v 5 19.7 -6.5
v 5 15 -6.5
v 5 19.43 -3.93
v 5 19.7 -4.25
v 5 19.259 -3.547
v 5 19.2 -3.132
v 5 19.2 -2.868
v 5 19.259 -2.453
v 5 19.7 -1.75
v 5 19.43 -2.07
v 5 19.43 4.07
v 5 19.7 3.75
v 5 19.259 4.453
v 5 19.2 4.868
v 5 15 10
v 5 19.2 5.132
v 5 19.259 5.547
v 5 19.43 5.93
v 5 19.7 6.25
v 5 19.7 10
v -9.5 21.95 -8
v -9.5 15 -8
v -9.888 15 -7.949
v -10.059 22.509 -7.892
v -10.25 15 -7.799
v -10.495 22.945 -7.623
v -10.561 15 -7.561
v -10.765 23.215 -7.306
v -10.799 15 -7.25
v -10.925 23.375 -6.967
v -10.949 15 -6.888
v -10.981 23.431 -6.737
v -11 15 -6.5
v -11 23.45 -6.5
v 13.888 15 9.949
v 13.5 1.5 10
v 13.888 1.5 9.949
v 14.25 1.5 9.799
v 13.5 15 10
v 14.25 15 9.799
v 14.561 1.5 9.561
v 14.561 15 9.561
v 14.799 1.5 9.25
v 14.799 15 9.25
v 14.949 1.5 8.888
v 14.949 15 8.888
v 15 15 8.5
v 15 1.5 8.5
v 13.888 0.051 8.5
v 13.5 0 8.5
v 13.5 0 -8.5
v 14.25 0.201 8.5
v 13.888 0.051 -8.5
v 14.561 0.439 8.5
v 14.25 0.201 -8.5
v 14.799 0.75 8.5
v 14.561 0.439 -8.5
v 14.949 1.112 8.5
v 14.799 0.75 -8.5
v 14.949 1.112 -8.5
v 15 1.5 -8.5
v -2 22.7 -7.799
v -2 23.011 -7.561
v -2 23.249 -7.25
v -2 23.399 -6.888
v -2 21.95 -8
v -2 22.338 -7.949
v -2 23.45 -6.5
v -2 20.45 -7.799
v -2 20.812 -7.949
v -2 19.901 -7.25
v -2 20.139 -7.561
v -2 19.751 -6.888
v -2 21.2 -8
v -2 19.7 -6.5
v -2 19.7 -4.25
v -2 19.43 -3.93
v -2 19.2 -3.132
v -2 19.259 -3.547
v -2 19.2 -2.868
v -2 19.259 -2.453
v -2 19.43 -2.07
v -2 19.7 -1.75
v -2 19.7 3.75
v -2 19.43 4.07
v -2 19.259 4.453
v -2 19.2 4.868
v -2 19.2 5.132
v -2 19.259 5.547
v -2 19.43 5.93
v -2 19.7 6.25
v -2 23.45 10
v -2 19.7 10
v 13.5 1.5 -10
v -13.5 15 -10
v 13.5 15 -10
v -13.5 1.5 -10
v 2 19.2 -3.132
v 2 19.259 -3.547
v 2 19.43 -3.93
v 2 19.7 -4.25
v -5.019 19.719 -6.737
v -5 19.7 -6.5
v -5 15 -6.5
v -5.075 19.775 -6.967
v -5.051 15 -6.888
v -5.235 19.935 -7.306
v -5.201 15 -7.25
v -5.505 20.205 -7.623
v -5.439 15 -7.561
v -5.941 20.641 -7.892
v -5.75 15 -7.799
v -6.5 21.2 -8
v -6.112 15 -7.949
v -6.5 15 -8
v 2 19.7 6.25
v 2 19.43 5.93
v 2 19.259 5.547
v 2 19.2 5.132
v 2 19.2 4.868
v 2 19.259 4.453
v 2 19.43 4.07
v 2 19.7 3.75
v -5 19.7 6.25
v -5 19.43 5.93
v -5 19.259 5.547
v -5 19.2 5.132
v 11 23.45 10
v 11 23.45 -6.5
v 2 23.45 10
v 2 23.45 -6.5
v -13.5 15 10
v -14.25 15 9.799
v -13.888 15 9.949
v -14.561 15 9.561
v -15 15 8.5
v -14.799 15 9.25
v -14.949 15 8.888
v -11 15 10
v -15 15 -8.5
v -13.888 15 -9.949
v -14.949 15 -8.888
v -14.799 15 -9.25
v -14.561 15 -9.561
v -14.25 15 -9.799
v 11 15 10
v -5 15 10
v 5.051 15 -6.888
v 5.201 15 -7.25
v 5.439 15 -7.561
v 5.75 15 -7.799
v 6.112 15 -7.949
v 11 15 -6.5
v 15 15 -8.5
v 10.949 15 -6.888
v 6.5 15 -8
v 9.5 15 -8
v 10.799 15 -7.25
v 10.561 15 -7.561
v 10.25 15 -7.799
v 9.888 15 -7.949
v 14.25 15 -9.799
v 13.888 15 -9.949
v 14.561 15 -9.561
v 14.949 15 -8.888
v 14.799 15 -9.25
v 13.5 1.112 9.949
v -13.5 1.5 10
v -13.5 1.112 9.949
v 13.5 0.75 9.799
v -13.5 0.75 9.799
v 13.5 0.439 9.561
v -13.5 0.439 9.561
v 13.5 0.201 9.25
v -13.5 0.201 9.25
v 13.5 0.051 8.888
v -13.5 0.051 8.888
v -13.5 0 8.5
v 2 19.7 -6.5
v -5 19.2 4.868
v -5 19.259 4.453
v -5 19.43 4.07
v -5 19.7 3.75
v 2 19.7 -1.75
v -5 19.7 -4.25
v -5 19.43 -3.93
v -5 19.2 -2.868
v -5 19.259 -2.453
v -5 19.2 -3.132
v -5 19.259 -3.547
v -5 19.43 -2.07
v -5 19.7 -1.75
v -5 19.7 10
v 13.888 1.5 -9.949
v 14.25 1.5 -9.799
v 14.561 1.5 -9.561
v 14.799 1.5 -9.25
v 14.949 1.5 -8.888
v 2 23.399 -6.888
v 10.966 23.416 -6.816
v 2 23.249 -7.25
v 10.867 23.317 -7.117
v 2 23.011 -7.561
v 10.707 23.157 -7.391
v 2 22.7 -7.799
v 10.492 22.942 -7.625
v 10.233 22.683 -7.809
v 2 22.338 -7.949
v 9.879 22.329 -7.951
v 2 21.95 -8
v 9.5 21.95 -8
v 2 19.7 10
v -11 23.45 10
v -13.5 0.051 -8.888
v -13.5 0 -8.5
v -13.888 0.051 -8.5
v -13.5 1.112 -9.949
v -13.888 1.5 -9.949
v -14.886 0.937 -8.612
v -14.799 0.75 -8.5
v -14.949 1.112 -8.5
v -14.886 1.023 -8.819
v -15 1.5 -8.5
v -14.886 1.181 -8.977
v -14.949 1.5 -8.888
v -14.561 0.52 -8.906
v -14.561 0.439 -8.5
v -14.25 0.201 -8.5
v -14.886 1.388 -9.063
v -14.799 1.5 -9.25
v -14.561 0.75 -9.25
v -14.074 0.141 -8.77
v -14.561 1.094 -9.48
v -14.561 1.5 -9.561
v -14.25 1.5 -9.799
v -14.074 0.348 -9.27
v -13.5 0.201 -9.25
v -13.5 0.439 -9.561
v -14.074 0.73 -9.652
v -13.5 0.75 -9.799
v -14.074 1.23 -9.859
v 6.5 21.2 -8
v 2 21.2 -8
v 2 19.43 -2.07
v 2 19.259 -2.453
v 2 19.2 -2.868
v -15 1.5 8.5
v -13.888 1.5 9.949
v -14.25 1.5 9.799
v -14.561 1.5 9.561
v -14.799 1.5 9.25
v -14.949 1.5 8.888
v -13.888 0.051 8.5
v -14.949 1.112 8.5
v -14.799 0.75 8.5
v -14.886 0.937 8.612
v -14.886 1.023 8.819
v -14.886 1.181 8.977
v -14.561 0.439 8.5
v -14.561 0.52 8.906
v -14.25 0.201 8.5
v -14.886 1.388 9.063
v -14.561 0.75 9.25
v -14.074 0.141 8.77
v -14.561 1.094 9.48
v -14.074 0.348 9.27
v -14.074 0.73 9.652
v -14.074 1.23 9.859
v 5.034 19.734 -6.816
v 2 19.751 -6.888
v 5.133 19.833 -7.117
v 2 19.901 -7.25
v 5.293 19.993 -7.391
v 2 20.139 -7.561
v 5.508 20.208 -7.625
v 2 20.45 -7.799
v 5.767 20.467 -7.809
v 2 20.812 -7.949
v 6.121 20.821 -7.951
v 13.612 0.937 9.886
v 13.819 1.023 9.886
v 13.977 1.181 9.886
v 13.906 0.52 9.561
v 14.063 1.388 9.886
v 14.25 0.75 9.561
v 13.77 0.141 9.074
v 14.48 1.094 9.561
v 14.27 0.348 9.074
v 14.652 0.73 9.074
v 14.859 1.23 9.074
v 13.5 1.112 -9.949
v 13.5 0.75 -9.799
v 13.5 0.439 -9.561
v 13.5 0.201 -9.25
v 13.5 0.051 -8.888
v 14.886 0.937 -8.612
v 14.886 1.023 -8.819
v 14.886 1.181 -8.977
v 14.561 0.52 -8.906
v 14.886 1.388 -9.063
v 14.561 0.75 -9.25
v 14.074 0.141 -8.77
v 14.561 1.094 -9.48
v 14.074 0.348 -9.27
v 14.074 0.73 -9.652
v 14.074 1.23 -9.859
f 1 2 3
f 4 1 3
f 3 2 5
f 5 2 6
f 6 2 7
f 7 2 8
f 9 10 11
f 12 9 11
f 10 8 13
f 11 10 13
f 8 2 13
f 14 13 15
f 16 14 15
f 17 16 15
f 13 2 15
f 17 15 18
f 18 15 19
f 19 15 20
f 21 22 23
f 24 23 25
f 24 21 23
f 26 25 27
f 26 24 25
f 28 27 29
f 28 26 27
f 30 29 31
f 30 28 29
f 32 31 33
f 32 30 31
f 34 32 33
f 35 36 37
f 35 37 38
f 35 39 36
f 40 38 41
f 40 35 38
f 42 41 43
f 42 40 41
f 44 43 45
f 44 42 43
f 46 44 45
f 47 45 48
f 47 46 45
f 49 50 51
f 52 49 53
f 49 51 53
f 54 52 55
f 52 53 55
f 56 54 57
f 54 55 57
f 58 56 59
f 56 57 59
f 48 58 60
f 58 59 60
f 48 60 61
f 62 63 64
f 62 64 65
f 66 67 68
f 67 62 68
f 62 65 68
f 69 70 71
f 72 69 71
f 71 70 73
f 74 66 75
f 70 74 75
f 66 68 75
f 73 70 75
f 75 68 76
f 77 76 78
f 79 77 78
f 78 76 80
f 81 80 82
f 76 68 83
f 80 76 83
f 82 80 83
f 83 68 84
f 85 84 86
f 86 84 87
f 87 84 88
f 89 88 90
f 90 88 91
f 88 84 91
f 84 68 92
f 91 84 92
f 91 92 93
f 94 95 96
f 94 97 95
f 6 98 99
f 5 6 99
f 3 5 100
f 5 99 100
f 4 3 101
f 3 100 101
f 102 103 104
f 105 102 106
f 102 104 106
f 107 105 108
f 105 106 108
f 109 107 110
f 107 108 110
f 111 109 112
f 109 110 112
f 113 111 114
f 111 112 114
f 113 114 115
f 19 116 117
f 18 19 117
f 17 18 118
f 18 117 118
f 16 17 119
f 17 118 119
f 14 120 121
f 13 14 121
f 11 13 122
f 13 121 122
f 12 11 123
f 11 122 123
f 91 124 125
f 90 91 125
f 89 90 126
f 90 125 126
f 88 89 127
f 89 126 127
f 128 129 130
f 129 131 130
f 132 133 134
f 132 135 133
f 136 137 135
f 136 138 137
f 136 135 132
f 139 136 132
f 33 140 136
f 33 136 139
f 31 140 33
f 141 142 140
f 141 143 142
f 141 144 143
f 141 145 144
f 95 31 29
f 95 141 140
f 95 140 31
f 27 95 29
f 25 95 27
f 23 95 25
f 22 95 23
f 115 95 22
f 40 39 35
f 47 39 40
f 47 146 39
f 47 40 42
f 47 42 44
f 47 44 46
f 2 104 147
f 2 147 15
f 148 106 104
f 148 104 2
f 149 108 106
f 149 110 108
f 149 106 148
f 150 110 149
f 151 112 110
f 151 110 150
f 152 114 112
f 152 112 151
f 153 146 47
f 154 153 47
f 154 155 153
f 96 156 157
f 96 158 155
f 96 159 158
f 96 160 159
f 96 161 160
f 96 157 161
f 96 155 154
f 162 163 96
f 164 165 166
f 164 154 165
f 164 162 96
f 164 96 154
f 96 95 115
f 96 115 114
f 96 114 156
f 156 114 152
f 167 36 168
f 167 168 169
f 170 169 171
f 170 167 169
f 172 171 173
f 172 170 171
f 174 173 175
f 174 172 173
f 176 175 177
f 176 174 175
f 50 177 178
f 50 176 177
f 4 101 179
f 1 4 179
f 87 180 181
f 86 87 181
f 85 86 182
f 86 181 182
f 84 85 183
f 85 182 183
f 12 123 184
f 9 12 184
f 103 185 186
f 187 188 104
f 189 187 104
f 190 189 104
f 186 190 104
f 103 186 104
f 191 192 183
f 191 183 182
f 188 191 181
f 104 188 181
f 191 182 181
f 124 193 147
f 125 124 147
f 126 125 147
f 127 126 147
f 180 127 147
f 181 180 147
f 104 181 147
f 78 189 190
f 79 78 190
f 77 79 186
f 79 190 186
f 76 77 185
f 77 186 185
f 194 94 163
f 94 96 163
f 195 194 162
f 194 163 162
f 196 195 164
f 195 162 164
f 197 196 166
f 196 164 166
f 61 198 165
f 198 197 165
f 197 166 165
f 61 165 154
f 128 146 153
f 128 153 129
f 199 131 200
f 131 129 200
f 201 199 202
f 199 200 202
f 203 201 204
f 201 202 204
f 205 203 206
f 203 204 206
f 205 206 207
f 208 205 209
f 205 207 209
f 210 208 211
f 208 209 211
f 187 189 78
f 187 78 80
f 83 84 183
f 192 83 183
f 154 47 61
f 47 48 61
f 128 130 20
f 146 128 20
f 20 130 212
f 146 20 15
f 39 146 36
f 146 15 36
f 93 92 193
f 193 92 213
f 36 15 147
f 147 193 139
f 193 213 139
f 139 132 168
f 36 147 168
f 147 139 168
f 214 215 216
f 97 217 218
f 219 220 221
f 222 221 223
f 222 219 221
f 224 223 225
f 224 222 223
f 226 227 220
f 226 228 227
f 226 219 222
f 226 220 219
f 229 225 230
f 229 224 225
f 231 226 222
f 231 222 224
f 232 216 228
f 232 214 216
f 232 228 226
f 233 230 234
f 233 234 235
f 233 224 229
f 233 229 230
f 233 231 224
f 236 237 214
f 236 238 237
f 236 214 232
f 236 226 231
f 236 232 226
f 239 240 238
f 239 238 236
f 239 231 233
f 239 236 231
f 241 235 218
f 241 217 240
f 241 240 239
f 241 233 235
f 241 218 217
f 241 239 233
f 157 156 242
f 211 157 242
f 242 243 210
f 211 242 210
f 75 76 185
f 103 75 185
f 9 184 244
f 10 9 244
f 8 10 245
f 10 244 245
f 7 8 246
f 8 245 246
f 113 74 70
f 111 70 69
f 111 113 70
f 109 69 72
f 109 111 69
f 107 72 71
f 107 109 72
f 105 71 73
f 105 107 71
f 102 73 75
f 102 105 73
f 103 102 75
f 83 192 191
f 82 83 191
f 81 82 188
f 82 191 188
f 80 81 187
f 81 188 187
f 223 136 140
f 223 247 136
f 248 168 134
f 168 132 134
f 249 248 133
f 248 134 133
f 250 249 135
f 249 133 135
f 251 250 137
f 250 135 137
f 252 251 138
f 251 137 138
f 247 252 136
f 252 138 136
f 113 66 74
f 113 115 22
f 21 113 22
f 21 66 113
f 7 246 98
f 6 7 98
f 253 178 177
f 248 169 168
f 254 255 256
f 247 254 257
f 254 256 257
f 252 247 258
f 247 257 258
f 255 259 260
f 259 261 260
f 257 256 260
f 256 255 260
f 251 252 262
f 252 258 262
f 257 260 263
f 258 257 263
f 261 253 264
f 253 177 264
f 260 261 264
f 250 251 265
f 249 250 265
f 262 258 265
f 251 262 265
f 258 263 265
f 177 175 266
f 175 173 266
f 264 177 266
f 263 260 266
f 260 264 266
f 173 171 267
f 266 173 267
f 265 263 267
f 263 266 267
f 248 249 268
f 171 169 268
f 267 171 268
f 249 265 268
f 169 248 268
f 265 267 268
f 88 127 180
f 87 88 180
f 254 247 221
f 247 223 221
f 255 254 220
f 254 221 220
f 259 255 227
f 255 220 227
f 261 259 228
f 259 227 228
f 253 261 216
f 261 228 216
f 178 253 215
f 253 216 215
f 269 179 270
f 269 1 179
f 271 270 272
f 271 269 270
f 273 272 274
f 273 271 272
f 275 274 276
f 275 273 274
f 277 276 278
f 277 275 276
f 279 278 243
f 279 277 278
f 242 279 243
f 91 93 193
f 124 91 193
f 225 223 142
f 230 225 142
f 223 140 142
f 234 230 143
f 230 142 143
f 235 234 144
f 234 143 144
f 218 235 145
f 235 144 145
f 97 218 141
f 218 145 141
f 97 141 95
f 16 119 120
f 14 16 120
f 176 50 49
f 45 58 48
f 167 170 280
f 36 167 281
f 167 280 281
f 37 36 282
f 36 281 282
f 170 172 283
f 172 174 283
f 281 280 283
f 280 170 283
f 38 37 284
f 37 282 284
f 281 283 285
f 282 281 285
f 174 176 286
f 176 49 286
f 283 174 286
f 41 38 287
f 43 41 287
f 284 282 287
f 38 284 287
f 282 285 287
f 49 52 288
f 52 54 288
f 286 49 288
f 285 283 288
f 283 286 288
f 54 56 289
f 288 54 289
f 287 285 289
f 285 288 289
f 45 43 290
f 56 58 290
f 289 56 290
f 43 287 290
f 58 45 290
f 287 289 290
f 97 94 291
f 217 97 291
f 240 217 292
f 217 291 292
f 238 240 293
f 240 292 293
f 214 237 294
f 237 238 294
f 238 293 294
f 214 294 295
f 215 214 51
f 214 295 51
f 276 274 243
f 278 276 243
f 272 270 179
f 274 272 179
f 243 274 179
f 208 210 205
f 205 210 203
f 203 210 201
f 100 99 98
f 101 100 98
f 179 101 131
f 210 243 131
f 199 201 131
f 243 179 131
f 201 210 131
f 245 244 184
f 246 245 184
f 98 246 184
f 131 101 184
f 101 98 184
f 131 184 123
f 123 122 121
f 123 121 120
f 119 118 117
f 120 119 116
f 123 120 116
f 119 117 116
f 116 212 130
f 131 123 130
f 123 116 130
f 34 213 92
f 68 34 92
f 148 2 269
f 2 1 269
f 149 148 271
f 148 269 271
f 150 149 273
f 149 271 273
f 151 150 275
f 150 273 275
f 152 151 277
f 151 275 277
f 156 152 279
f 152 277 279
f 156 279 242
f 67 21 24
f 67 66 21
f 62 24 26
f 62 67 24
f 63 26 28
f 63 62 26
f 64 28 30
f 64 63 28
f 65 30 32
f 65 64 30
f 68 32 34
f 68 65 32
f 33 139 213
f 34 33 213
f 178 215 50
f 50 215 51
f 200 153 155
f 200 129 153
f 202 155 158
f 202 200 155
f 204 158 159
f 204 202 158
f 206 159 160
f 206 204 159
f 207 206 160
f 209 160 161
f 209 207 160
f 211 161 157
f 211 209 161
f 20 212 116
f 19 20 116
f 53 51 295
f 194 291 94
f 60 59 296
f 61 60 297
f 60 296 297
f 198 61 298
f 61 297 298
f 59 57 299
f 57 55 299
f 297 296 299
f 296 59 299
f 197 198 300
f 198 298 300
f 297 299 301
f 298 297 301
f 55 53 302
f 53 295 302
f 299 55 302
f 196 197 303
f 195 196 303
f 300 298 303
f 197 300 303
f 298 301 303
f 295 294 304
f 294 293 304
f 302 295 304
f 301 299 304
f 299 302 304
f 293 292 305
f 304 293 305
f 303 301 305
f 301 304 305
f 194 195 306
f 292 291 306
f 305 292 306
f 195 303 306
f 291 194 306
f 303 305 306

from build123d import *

# Parameters (mm, degrees)
SKETCH1_W            = 30
SKETCH1_H            = 20
BOSS_EXTRUDE1_DEPTH  = 15
BOSS_EXTRUDE2_DEPTH  = 18
SKETCH3_W            = 2.5
SKETCH3_H            = 0.5
BOSS_EXTRUDE3_DEPTH  = 3
FILLET1_R            = 1.5
FILLET1_OF_MIRROR1_R = 1.5
MIRROR2_START        = 5
MIRROR2_OUTLINE_W    = 8.45
MIRROR2_OUTLINE_H    = 18
MIRROR2_DEPTH        = 6
MIRROR2_START_2      = 2
MIRROR2_2_DEPTH      = 3
FILLET2_R            = 1.5


# Read off the part's stored shape, not the designer's step: Mirror2
with BuildPart() as part:
    # Sketch1 → Boss-Extrude1 (new body)
    with BuildSketch(Plane(origin=(0, 0, 0), x_dir=(1, 0, 0), z_dir=(0, 1, 0))):
        Rectangle(SKETCH1_W, SKETCH1_H)
    extrude(amount=BOSS_EXTRUDE1_DEPTH)

    # Sketch2 → Boss-Extrude2 (add)
    with BuildSketch(Plane.XY.offset(10)):
        Polygon((-11, 15), (-11, 23.45), (-2, 23.45), (-2, 19.7), (-5, 19.7), (-5, 15), align=None)
    extrude(amount=-BOSS_EXTRUDE2_DEPTH)

    # Sketch3 → Boss-Extrude3 (add)
    with BuildSketch(Plane(origin=(-5, 0, 0), x_dir=(0, 0, -1), z_dir=(1, 0, 0))):
        with Locations((-5, 19.45)):
            Rectangle(SKETCH3_W, SKETCH3_H)
    boss_extrude3 = extrude(amount=BOSS_EXTRUDE3_DEPTH)

    # Fillet1
    # the kernel refuses this fillet: 1.5 mm, written as the material it takes off along each edge
    with BuildSketch(Plane(origin=(-5, 19.2, 3.75), x_dir=(0, 1, 0), z_dir=(1, 0, 0))) as fillet1_piece_1:
        with BuildLine():
            CenterArc((1.5, 1.118033989), FILLET1_R, 180, 48.189685104)
            Line((0, 1.118033989), (-0.03, 1.118033989))
            Line((-0.03, 1.118033989), (-0.03, 0))
            Line((-0.03, 0), (0, -0.03))
            ThreePointArc((0, -0.03), (0.25, -0.03), (0.48, -0.02236068))
            Line((0.48, -0.02236068), (0.5, 0))
        make_face()
    extrude(amount=5.795084972, mode=Mode.SUBTRACT)
    with BuildSketch(Plane(origin=(-5, 19.2, 6.25), x_dir=(0, 1, 0), z_dir=(1, 0, 0))) as fillet1_piece_2:
        with BuildLine():
            CenterArc((1.5, -1.118033989), FILLET1_R, 131.810314896, 48.189685104)
            Line((0, -1.118033989), (-0.03, -1.118033989))
            Line((-0.03, -1.118033989), (-0.03, 0))
            Line((-0.03, 0), (0, 0.03))
            ThreePointArc((0, 0.03), (0.25, 0.03), (0.48, 0.02236068))
            Line((0.48, 0.02236068), (0.5, 0))
        make_face()
    extrude(amount=5.795084972, mode=Mode.SUBTRACT)

    # Mirror1: Boss-Extrude3 across plane
    add(boss_extrude3.mirror(Plane(origin=(0, 0, 1), x_dir=(1, 0, 0), z_dir=(0, 0, -1))))

    # Fillet1 of Mirror1
    # the kernel refuses this fillet: 1.5 mm, written as the material it takes off along each edge
    with BuildSketch(Plane(origin=(-5, 19.2, -1.75), x_dir=(0, 0, -1), z_dir=(1, 0, 0))) as fillet1_of_mirror1_piece_1:
        with BuildLine():
            CenterArc((1.118033989, 1.5), FILLET1_OF_MIRROR1_R, 221.810314896, 48.189685104)
            Line((0, 0.5), (-0.02236068, 0.48))
            ThreePointArc((-0.02236068, 0.48), (-0.03, 0.25), (-0.03, 0))
            Line((-0.03, 0), (0, -0.03))
            Line((0, -0.03), (1.118033989, -0.03))
            Line((1.118033989, -0.03), (1.118033989, 0))
        make_face()
    extrude(amount=5.795084972, mode=Mode.SUBTRACT)
    with BuildSketch(Plane(origin=(-5, 19.2, -4.25), x_dir=(0, 1, 0), z_dir=(1, 0, 0))) as fillet1_of_mirror1_piece_2:
        with BuildLine():
            CenterArc((1.5, 1.118033989), FILLET1_OF_MIRROR1_R, 180, 48.189685104)
            Line((0, 1.118033989), (-0.03, 1.118033989))
            Line((-0.03, 1.118033989), (-0.03, 0))
            Line((-0.03, 0), (0, -0.03))
            ThreePointArc((0, -0.03), (0.25, -0.03), (0.48, -0.02236068))
            Line((0.48, -0.02236068), (0.5, 0))
        make_face()
    extrude(amount=5.795084972, mode=Mode.SUBTRACT)

    # Mirror2 outline → Mirror2 (add)
    with BuildSketch(Plane.YZ.offset(MIRROR2_START)):
        with Locations((19.225, 1)):
            Rectangle(MIRROR2_OUTLINE_W, MIRROR2_OUTLINE_H)
    extrude(amount=MIRROR2_DEPTH)

    # Mirror2 2 outline → Mirror2 2 (add)
    with BuildSketch(Plane.YZ.offset(MIRROR2_START_2)):
        with BuildLine():
            Line((19.7, -4.25), (19.7, -8))
            Line((19.7, -8), (23.45, -8))
            Line((23.45, -8), (23.45, 10))
            Line((23.45, 10), (19.7, 10))
            Line((19.7, 10), (19.7, 6.25))
            ThreePointArc((19.7, 6.25), (19.330693606, 5.744338447), (19.2, 5.131966011))
            Line((19.2, 5.131966011), (19.2, 4.868033989))
            ThreePointArc((19.2, 4.868033989), (19.330693606, 4.255661553), (19.7, 3.75))
            Line((19.7, 3.75), (19.7, -1.75))
            ThreePointArc((19.7, -1.75), (19.330693606, -2.255661553), (19.2, -2.868033989))
            Line((19.2, -2.868033989), (19.2, -3.131966011))
            ThreePointArc((19.2, -3.131966011), (19.330693606, -3.744338447), (19.7, -4.25))
        make_face()
    extrude(amount=MIRROR2_2_DEPTH)

    # Fillet2
    fillet2_edges = [part.edges().sort_by_distance(p)[0] for p in [
        (-11, 19.225, -8),
        (-6.5, 23.45, -8),
        (-3.5, 19.7, -8),
        (-5, 17.35, -8),
        (0, 0, -10),
        (15, 0, 0),
        (0, 0, 10),
        (-15, 0, 0),
        (-15, 7.5, -10),
        (15, 7.5, -10),
        (15, 7.5, 10),
        (-15, 7.5, 10),
        (5, 17.35, -8),
        (3.5, 19.7, -8),
        (6.5, 23.45, -8),
        (11, 19.225, -8),
    ]]
    fillet(fillet2_edges, radius=FILLET2_R)


solid = part.part
